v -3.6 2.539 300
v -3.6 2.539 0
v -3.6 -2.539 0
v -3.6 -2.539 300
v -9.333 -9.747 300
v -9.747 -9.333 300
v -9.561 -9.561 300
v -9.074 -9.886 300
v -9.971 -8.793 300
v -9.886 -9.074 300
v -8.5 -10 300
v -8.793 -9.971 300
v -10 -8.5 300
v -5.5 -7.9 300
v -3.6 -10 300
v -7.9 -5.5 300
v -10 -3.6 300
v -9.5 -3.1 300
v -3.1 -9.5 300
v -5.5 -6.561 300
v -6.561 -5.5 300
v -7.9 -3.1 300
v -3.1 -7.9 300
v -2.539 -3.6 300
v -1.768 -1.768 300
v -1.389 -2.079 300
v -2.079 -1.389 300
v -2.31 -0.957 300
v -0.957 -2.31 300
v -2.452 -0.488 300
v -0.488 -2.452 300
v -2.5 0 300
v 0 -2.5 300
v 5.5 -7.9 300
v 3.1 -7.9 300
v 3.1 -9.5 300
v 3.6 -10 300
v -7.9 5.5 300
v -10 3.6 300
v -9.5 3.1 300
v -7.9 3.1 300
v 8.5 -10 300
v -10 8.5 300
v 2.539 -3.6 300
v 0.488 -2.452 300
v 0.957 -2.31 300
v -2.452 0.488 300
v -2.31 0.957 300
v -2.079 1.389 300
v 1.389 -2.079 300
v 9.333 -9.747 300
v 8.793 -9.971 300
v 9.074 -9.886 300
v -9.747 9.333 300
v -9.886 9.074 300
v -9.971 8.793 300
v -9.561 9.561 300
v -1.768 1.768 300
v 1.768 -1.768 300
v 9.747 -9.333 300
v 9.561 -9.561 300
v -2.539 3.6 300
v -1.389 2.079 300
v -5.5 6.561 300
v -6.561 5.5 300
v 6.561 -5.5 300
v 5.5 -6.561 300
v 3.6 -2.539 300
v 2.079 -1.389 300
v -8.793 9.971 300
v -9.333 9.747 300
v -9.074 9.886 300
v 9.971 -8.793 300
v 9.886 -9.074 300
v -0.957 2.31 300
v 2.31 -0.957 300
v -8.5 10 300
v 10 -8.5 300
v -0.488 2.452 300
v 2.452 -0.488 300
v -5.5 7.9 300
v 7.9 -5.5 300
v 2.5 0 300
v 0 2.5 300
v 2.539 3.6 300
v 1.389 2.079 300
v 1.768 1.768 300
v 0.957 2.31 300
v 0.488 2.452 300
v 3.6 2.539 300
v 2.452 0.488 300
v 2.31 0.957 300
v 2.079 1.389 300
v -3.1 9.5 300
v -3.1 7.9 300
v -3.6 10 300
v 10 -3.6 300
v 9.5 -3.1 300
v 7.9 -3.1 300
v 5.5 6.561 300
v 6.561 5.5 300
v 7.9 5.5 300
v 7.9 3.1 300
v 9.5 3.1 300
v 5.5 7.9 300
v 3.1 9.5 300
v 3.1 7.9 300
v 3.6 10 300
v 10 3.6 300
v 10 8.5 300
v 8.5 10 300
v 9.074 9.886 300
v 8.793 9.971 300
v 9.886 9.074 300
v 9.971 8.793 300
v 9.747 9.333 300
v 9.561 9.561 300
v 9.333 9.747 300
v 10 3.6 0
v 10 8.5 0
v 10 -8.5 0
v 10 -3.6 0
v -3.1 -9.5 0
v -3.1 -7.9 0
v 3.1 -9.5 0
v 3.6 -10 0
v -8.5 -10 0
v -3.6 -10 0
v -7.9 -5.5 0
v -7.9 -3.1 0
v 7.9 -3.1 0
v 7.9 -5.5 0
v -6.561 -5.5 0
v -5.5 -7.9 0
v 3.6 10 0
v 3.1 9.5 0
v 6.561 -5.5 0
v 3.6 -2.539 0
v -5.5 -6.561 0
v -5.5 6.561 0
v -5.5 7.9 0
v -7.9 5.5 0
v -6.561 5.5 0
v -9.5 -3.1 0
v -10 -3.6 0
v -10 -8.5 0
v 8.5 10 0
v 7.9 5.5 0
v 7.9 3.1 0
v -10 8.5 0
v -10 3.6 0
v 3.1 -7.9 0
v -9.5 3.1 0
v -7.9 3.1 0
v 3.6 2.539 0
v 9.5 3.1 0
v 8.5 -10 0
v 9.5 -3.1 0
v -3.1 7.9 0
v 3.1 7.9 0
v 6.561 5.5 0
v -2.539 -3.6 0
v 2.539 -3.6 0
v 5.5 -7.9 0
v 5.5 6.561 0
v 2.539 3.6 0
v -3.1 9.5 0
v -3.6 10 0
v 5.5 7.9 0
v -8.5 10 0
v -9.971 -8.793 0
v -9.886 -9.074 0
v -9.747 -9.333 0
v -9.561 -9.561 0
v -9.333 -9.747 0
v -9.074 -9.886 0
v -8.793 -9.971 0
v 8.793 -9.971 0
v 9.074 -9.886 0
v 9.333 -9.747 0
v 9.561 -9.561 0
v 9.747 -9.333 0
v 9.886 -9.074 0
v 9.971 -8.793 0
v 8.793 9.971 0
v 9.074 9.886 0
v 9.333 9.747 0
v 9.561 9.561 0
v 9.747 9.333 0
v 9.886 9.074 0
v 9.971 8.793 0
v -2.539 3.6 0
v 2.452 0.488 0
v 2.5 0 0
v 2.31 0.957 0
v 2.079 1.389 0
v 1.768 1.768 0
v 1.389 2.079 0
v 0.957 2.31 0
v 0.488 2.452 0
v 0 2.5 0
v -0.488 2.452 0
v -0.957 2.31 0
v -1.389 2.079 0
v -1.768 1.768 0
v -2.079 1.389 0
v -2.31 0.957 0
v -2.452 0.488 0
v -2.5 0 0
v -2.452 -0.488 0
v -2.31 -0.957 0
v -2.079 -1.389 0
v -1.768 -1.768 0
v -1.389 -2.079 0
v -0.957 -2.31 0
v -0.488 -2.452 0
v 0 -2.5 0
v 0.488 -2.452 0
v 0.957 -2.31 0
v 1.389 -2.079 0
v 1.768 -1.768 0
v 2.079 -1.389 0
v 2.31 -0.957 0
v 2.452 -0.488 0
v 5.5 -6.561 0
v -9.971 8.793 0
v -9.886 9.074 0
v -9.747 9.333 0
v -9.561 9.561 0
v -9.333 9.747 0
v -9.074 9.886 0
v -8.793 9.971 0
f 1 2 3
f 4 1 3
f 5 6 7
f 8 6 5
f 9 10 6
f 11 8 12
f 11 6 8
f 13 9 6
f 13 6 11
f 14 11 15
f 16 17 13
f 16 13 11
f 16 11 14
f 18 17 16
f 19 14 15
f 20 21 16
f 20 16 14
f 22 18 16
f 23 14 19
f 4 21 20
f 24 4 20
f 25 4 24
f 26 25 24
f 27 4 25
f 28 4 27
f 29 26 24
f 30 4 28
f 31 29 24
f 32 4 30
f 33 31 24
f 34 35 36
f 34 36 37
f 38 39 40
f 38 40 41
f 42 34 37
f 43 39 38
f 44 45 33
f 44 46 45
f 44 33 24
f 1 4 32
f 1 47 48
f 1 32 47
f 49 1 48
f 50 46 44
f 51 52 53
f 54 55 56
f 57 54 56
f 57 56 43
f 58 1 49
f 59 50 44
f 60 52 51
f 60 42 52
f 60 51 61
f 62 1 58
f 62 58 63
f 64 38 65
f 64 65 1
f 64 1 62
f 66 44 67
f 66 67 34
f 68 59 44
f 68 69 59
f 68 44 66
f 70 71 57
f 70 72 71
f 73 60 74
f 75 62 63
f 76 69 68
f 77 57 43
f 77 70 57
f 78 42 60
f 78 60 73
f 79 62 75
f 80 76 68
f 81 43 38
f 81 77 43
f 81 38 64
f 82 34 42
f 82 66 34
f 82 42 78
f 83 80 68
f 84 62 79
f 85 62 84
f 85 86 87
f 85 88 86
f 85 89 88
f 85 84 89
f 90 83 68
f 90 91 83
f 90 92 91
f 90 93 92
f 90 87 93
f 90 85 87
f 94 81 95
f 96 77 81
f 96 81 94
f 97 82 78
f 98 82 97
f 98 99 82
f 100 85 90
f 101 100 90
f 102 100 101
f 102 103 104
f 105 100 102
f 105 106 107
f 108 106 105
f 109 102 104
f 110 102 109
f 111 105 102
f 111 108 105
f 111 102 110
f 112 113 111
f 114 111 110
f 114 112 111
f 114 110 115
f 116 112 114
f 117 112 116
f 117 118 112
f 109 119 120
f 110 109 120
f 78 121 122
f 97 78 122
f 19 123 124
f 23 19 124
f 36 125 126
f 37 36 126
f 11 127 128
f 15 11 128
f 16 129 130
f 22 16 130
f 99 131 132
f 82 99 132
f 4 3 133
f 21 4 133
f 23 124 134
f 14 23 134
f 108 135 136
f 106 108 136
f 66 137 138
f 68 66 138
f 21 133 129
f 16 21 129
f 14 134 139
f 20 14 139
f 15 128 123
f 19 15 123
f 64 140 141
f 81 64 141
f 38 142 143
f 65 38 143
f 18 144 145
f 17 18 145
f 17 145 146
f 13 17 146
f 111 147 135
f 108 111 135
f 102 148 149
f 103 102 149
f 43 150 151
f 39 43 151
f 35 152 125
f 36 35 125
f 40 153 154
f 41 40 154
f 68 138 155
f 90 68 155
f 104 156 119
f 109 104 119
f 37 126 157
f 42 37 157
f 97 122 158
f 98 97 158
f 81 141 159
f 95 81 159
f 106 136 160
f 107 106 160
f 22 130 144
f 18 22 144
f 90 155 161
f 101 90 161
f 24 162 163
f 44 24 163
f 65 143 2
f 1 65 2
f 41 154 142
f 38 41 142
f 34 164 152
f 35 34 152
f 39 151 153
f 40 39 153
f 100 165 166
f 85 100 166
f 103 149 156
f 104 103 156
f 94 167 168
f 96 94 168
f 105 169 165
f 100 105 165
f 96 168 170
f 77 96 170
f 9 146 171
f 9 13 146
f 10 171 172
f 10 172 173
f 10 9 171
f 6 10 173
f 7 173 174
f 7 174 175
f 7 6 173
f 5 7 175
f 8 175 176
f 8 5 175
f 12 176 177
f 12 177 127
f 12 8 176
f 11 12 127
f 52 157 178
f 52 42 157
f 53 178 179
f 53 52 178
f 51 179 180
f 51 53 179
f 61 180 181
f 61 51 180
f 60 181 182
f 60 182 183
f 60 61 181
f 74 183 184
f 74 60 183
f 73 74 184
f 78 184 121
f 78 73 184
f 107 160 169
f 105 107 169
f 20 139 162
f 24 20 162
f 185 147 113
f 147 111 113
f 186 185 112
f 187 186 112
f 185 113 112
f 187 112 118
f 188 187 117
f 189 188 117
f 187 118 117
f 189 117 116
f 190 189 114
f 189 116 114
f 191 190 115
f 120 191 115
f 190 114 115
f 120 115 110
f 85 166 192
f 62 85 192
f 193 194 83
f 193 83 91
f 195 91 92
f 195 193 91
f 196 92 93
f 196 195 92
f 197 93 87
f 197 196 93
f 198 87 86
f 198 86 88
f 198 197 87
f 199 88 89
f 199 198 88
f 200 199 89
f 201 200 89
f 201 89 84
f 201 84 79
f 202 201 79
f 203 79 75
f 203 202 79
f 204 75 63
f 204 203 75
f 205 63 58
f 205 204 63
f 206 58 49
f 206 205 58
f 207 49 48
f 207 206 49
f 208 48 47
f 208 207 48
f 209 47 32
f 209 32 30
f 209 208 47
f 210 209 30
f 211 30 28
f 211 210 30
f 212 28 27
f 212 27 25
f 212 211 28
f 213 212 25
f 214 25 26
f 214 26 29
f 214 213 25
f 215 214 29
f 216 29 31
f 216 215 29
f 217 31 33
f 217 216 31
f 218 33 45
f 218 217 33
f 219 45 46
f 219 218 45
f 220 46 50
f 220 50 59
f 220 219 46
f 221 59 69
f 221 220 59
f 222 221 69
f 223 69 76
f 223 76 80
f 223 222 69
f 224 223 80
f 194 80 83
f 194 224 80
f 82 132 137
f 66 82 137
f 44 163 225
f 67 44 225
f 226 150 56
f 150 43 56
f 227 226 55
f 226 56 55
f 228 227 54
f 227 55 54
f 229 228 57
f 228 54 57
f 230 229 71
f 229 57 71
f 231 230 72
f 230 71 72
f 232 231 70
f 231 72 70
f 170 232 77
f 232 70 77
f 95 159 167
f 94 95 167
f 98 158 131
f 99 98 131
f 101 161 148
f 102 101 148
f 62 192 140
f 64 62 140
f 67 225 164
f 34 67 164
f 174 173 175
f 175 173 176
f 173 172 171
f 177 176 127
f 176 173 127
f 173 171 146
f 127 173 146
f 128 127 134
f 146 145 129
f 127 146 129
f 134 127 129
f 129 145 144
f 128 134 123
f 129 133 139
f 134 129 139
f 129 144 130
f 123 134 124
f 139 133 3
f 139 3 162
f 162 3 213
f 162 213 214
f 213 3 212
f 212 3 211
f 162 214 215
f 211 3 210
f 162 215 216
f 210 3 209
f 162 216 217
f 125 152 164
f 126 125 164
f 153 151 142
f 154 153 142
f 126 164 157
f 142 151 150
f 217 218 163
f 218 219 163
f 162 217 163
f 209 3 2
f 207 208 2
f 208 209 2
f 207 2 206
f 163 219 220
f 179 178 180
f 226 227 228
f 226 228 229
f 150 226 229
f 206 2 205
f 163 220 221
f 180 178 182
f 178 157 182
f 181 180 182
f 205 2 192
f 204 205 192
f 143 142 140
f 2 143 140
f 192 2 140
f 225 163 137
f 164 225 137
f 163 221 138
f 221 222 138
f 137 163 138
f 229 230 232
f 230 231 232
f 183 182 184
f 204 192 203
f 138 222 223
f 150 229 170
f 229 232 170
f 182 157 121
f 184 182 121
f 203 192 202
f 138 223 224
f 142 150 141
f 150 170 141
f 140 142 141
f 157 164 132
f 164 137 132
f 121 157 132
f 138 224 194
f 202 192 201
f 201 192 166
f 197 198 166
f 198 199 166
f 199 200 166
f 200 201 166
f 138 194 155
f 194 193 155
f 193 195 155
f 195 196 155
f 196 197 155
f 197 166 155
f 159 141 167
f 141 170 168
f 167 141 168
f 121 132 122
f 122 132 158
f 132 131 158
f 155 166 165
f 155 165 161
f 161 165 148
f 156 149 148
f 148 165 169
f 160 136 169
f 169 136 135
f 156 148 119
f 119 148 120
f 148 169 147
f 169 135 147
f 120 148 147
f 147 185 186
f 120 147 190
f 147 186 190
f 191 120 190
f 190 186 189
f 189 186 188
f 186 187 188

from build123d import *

# Parameters (mm, degrees)
SKETCH_R  = 2.5
PAD_DEPTH = 300
FILLET_R  = 1.5


with BuildPart() as part:
    # Sketch → Pad (new body)
    with BuildSketch(Plane.XY):
        Polygon((-3.6, 2.53934), (-3.6, -2.53934), (-6.56066, -5.5), (-7.9, -5.5), (-7.9, -3.1), (-9.5, -3.1), (-10, -3.6), (-10, -10), (-3.6, -10), (-3.1, -9.5), (-3.1, -7.9), (-5.5, -7.9), (-5.5, -6.56066), (-2.53934, -3.6), (2.53934, -3.6), (5.5, -6.56066), (5.5, -7.9), (3.1, -7.9), (3.1, -9.5), (3.6, -10), (10, -10), (10, -3.6), (9.5, -3.1), (7.9, -3.1), (7.9, -5.5), (6.56066, -5.5), (3.6, -2.53934), (3.6, 2.53934), (6.56066, 5.5), (7.899992, 5.5), (7.899998, 3.1), (9.5, 3.1), (10, 3.6), (10, 10), (3.6, 10), (3.1, 9.5), (3.1, 7.9), (5.5, 7.9), (5.5, 6.56066), (2.53934, 3.6), (-2.53934, 3.6), (-5.5, 6.56066), (-5.5, 7.9), (-3.1, 7.9), (-3.1, 9.5), (-3.6, 10), (-10, 10), (-10, 3.6), (-9.5, 3.1), (-7.9, 3.1), (-7.9, 5.5), (-6.56066, 5.5), align=None)
        Circle(SKETCH_R, mode=Mode.SUBTRACT)
    extrude(amount=PAD_DEPTH)

    # Fillet
    fillet_edges = [part.edges().sort_by_distance(p)[0] for p in [
        (-10, -10, 150),
        (10, -10, 150),
        (10, 10, 150),
        (-10, 10, 150),
    ]]
    fillet(fillet_edges, radius=FILLET_R)


solid = part.part
